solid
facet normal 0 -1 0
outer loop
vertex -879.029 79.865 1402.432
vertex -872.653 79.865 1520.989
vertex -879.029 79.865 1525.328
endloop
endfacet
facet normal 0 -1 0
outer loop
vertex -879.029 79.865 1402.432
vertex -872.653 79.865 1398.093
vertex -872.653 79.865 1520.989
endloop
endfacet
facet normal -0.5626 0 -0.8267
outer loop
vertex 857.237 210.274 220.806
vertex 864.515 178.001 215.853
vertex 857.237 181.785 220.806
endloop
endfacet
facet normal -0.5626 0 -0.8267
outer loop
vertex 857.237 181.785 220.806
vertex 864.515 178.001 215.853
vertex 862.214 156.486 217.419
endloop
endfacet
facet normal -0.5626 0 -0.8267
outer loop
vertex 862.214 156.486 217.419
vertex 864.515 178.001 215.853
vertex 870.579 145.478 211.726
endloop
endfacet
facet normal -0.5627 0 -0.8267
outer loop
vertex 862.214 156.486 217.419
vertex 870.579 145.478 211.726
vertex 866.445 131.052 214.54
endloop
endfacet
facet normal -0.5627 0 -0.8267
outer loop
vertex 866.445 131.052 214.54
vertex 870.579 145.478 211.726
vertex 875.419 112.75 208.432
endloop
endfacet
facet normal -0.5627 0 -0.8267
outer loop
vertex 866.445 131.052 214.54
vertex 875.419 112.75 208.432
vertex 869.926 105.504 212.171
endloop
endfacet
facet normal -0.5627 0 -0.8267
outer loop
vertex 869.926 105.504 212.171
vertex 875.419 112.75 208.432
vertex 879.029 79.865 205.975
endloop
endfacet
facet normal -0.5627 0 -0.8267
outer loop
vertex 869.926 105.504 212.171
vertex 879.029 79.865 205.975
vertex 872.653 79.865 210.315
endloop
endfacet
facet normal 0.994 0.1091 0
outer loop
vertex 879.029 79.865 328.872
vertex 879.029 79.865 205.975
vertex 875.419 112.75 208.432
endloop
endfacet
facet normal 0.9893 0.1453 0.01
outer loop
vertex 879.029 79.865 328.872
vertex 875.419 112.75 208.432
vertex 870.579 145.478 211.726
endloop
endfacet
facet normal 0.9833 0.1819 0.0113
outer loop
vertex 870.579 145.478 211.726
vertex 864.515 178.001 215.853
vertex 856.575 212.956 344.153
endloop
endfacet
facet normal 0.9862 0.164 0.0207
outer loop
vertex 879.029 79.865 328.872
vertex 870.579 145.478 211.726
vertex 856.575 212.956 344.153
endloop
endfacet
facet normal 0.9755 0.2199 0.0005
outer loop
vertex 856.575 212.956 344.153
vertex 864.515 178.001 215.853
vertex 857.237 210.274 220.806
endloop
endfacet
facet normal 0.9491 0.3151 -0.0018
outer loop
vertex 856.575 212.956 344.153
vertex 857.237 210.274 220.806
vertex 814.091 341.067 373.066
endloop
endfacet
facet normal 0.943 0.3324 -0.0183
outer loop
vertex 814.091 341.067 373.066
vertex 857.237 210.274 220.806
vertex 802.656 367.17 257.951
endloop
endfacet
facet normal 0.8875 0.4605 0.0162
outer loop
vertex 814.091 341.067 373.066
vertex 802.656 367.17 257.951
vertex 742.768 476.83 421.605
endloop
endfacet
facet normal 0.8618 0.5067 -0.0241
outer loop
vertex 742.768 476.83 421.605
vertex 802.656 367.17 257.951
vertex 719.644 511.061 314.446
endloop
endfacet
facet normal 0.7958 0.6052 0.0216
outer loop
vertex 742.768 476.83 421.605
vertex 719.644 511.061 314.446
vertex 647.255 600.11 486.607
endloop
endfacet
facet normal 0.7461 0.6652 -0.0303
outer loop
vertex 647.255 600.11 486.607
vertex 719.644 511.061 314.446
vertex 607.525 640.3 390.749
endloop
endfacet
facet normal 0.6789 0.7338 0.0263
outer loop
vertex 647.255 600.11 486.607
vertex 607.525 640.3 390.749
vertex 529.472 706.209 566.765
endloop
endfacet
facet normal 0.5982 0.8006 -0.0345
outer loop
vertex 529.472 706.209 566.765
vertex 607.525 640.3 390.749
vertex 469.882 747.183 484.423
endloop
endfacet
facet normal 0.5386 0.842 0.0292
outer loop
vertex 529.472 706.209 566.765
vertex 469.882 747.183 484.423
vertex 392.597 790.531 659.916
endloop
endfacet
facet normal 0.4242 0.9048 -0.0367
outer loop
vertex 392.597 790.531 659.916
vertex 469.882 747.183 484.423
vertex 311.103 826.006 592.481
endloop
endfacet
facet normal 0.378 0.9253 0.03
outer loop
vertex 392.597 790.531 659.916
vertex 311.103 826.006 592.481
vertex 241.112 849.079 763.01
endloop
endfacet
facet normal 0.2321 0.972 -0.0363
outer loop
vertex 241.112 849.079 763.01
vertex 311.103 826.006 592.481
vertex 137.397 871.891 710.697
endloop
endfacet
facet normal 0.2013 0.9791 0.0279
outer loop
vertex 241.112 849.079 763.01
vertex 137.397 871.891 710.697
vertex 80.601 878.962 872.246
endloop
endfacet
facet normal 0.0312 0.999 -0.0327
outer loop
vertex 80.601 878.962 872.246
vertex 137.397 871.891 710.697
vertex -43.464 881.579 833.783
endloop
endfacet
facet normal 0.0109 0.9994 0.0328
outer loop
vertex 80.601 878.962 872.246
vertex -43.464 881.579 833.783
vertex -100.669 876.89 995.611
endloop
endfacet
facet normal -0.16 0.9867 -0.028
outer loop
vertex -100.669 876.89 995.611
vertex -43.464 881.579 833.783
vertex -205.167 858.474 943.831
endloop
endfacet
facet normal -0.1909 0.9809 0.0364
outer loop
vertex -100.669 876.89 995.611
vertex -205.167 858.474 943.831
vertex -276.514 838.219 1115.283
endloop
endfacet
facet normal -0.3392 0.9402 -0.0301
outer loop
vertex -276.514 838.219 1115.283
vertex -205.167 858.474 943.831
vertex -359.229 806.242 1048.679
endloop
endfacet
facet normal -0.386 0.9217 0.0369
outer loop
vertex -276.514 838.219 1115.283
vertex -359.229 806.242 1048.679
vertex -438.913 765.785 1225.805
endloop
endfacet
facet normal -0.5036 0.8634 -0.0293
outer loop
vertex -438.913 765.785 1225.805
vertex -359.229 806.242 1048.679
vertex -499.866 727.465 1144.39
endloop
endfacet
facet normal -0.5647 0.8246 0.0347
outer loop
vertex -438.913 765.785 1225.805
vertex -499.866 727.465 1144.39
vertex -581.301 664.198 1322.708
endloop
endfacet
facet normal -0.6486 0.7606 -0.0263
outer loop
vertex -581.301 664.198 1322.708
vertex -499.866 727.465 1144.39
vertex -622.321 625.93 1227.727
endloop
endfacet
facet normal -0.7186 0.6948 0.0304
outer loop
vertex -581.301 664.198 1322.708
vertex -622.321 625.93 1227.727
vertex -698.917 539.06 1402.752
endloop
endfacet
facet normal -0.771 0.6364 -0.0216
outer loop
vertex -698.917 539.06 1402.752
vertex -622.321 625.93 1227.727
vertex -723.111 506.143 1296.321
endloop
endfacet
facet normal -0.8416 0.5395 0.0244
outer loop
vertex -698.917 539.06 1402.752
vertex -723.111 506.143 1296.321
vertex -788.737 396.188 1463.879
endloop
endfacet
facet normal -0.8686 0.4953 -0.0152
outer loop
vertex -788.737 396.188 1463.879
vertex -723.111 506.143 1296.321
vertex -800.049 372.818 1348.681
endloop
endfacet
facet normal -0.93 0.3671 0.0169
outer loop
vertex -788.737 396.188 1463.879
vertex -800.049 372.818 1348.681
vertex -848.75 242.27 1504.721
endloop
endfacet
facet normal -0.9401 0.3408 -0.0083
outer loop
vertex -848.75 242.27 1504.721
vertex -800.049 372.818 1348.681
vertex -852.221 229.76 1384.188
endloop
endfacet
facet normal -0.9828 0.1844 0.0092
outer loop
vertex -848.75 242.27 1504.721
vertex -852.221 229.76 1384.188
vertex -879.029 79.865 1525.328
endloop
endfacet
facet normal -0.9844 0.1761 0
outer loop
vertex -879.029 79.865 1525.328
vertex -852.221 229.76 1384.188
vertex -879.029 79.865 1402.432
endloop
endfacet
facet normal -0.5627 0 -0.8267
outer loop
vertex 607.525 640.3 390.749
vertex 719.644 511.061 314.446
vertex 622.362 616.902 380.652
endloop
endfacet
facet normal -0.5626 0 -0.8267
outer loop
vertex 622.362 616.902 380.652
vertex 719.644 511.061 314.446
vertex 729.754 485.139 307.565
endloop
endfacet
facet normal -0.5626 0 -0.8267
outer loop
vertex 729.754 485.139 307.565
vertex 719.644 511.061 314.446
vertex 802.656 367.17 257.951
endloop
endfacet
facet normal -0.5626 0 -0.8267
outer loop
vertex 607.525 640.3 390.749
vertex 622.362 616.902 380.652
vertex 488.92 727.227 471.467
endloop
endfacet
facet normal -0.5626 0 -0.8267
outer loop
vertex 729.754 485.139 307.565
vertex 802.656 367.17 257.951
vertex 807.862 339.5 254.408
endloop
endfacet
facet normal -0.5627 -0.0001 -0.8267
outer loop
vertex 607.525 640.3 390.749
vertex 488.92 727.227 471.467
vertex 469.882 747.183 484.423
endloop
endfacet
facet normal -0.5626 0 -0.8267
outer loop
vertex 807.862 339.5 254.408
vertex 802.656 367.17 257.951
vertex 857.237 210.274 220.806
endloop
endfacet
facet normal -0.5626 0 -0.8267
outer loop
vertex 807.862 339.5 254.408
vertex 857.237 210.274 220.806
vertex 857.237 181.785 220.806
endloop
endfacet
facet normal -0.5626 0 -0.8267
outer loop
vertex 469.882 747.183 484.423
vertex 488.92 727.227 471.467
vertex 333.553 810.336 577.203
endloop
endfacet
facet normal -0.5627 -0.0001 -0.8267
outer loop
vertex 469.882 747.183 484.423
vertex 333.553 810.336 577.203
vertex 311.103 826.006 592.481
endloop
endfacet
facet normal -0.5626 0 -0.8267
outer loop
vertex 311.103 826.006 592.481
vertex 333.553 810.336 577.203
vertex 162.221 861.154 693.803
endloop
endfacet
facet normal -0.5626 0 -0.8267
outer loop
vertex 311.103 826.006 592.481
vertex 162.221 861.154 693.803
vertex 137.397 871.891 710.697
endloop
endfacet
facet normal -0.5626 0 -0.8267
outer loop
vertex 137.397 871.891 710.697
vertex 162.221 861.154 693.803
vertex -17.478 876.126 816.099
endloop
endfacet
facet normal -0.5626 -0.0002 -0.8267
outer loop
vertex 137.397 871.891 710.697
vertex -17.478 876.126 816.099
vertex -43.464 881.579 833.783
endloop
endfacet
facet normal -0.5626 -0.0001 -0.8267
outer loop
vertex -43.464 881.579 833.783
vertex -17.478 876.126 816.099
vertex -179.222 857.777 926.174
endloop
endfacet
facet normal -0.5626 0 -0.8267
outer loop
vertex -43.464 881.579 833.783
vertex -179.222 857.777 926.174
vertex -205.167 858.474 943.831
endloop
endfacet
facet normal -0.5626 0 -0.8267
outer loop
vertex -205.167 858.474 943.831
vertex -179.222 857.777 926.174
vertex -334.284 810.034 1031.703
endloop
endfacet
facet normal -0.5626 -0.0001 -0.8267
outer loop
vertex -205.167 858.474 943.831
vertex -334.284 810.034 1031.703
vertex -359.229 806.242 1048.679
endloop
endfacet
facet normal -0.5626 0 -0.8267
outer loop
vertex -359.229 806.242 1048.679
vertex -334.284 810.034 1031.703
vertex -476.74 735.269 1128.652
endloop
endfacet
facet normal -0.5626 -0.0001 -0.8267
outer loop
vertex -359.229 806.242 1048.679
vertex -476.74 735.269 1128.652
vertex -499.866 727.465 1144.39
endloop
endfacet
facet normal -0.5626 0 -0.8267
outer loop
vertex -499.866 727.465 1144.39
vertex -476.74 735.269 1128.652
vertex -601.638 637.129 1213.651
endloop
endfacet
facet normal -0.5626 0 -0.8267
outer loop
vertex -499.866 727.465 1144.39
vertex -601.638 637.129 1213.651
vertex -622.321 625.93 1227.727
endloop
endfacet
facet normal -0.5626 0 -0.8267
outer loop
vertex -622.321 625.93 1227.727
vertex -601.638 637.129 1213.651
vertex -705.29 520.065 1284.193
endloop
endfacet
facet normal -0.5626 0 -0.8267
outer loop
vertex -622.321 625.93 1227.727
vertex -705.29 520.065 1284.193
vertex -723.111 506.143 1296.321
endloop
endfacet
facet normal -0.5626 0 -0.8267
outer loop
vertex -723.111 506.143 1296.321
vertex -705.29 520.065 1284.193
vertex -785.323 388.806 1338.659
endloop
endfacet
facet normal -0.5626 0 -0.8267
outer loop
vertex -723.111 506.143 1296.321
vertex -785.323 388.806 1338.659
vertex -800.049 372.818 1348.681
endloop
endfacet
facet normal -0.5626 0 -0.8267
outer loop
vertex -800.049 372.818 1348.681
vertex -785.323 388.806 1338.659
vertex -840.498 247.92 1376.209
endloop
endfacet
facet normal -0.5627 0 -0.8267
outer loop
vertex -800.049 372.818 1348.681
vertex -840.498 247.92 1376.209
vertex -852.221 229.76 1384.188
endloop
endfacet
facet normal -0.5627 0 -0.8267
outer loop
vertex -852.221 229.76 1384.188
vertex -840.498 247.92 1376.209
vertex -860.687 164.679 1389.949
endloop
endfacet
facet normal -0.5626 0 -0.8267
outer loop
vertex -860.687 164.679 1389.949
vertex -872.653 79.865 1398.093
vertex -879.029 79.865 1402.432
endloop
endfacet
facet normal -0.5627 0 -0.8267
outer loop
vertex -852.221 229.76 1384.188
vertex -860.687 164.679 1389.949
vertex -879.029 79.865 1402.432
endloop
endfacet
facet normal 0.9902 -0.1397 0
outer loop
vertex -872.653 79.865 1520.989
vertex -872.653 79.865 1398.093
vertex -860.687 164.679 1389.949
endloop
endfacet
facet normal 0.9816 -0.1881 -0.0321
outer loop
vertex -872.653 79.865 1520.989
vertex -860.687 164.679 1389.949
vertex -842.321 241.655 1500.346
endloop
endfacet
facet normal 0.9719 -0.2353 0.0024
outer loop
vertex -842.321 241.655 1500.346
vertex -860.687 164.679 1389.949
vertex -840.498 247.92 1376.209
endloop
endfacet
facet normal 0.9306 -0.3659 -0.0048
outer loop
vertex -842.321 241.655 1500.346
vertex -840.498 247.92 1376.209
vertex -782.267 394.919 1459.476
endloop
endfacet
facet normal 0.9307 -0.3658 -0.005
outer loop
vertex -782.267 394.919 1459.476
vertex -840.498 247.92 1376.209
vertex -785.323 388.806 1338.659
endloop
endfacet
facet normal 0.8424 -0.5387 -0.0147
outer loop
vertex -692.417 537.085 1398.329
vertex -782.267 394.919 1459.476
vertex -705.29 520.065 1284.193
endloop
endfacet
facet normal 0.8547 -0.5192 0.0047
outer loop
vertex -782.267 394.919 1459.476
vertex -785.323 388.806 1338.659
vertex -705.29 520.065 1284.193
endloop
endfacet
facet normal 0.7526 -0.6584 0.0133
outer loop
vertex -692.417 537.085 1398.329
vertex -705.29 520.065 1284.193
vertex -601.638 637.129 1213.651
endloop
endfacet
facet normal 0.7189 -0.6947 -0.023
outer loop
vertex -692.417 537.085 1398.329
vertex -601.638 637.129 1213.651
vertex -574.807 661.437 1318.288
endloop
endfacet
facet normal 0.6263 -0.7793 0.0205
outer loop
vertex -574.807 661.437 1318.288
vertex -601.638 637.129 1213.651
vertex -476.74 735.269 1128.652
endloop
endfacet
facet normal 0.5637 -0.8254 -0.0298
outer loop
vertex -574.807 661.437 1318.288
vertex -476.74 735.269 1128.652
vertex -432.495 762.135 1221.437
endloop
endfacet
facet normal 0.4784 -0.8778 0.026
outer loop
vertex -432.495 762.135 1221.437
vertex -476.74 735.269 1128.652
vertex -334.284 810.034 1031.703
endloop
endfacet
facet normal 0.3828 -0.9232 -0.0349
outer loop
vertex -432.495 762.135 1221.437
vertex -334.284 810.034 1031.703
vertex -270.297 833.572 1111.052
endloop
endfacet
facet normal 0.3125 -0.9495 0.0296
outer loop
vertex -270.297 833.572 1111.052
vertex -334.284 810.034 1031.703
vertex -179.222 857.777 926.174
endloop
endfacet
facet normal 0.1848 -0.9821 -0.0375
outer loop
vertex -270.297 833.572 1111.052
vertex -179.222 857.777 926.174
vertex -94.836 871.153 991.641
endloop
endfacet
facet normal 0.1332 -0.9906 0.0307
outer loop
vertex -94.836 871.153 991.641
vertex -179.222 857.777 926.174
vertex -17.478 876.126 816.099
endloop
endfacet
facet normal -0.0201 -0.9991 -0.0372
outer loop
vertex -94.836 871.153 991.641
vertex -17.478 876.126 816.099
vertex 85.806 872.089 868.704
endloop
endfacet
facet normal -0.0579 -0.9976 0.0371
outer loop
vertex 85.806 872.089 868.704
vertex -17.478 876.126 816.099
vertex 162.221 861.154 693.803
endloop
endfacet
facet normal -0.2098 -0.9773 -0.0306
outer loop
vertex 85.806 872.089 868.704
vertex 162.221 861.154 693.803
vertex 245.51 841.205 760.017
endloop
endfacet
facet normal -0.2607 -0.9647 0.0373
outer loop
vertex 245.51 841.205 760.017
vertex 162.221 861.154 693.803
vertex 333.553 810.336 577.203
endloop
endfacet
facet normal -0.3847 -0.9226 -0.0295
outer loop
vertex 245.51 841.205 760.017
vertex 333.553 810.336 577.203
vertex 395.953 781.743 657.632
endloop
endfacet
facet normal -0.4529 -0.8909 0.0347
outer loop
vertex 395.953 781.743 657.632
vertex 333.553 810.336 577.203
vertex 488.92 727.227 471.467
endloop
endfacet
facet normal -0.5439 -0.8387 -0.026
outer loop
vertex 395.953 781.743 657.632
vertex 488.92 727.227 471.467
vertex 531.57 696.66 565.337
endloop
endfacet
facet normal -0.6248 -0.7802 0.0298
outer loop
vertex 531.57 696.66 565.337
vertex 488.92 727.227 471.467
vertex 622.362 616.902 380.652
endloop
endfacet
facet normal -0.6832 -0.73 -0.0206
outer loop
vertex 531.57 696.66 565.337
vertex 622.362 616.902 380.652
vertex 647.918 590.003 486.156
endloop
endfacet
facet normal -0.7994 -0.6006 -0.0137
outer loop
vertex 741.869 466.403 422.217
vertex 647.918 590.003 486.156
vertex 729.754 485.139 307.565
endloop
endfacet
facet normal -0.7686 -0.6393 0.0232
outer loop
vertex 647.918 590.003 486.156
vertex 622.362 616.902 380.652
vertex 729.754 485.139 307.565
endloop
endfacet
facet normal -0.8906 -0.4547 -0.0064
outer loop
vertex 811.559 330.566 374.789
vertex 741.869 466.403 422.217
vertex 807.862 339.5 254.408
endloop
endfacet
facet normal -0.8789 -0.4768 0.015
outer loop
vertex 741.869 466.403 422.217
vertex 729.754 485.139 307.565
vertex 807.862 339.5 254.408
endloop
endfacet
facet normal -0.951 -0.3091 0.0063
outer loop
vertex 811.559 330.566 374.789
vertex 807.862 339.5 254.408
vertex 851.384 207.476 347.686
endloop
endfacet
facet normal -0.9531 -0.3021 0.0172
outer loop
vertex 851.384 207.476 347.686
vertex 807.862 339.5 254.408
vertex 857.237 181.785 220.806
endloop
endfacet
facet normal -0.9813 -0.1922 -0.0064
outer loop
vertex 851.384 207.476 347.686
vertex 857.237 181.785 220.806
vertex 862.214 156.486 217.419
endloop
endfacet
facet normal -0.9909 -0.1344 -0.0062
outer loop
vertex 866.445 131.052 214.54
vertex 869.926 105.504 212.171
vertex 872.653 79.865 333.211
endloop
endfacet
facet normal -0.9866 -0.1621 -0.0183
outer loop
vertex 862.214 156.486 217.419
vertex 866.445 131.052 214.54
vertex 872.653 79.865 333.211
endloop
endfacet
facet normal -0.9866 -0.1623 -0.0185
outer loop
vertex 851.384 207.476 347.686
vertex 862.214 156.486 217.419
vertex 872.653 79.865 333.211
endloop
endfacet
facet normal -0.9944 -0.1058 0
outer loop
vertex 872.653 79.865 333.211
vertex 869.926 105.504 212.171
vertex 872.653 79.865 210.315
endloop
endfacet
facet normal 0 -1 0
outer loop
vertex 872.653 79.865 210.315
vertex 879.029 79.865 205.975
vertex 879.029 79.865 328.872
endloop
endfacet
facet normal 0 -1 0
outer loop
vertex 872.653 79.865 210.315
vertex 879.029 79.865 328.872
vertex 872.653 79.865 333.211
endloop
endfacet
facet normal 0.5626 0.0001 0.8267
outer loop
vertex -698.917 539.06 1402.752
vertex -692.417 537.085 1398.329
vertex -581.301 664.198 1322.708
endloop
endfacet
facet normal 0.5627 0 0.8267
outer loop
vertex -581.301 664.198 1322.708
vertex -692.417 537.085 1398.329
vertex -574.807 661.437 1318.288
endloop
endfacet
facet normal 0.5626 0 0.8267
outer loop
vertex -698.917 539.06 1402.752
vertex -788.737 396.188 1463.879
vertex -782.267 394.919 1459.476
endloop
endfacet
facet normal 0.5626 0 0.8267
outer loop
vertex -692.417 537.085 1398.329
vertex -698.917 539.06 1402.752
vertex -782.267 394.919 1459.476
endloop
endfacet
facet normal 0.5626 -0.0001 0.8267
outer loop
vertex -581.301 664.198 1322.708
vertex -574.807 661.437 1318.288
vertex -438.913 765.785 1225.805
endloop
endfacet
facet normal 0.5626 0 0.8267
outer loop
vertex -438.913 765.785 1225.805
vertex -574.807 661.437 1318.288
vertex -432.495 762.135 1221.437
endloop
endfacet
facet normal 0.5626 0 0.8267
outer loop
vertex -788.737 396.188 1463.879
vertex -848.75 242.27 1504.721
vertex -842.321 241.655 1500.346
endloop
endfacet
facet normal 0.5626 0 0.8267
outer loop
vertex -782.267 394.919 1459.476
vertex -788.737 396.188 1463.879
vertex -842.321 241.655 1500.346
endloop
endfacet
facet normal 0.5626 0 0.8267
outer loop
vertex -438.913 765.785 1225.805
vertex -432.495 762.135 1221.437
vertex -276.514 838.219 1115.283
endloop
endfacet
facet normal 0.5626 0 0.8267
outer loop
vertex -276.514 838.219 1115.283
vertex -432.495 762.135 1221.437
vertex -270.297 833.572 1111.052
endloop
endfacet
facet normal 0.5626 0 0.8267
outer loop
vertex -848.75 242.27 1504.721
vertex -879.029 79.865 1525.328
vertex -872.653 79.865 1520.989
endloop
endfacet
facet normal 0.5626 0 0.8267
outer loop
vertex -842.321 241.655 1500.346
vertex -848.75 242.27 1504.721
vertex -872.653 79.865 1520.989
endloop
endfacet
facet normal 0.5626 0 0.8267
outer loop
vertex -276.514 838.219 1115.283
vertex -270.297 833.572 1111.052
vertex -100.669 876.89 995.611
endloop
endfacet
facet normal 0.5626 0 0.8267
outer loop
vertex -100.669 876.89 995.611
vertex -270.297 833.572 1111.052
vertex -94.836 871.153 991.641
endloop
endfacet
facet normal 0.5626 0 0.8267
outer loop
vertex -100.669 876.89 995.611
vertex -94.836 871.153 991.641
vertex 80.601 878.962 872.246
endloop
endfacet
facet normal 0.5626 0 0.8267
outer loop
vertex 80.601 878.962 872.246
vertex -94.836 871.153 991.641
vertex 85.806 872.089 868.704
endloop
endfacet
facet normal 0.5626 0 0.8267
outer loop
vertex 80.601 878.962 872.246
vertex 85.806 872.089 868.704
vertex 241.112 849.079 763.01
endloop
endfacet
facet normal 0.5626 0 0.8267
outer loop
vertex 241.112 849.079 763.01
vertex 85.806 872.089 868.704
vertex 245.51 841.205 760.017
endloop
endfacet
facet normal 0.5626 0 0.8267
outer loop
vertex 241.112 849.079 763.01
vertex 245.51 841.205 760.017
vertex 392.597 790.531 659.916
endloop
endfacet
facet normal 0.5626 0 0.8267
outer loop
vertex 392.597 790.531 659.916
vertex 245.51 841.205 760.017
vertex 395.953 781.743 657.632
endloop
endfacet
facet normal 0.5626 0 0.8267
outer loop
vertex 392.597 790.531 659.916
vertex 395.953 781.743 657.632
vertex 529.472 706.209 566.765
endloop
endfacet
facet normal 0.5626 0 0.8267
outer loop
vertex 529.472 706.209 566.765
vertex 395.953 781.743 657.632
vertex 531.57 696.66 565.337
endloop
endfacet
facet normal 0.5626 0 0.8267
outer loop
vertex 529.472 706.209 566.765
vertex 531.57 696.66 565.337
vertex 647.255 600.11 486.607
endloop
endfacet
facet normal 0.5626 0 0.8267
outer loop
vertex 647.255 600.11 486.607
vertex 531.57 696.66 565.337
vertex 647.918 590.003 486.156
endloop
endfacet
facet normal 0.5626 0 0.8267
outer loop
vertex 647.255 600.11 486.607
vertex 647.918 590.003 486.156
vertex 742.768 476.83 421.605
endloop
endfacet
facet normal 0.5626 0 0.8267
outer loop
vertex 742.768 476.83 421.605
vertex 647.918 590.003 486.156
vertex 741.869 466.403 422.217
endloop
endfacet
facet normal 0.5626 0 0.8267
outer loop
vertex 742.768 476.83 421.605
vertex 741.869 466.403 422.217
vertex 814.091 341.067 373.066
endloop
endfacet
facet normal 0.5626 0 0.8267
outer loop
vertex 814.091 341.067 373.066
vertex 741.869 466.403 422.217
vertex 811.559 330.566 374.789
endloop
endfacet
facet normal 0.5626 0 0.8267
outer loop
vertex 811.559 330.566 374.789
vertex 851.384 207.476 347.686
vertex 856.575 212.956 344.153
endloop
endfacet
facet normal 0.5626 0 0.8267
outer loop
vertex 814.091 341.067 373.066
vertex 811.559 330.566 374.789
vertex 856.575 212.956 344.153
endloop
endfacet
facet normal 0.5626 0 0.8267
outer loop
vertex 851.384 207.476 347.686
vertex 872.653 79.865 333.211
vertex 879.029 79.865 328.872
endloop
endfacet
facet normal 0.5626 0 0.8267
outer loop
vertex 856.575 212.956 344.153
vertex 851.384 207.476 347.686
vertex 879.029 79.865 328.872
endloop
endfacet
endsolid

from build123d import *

# Parameters (mm, degrees)
F1_DEPTH = 1752.6
F3_DEPTH = 882.651
F6_DEPTH = 882.651
F7_DEPTH = 1525.507545


with BuildPart() as f1:
    # F0 (on Top) → F1 (new body)
    with BuildSketch(Plane.XY):
        with BuildLine():
            Line((879.29125, 0), (879.29125, 76.928016))
            ThreePointArc((879.29125, 76.928016), (0, 882.65), (-879.29125, 76.928016))
            Line((-879.29125, 76.928016), (-879.29125, 0))
            Line((-879.29125, 0), (879.29125, 0))
        make_face()
        with BuildLine():
            ThreePointArc((-872.965414, 76.374577), (0, 876.3), (872.965414, 76.374577))
            Line((872.965414, 76.374577), (872.965414, 21.737557))
            Line((872.965414, 21.737557), (-872.965414, 21.737557))
            Line((-872.965414, 21.737557), (-872.965414, 76.374577))
        make_face(mode=Mode.SUBTRACT)
    extrude(amount=F1_DEPTH)

    # F2 (on face) → F3 (cut, through all)
    with BuildSketch(Plane.XZ):
        Polygon((-914.4, 1821.486473), (-914.4, 1549.4), (914.4, 304.8), (994.86959, 1821.486473), align=None)
    extrude(amount=-F3_DEPTH, mode=Mode.SUBTRACT)

    # F4 (on face) → F6 (cut, through all)
    with BuildSketch(Plane.XZ):
        Polygon((857.237397, 220.805971), (-914.4, 1426.503644), (-914.4, 0), (914.4, 0), (914.4, 181.903644), align=None)
    extrude(amount=-F6_DEPTH, mode=Mode.SUBTRACT)

    # F5 (on Top) → F7 (cut, through all)
    with BuildSketch(Plane.XY):
        Polygon((-1011.60562, 79.864599), (-1011.60562, 0), (1011.60562, 0), (1018.673658, 79.864599), align=None)
    extrude(amount=F7_DEPTH, mode=Mode.SUBTRACT)


solid = f1.part
